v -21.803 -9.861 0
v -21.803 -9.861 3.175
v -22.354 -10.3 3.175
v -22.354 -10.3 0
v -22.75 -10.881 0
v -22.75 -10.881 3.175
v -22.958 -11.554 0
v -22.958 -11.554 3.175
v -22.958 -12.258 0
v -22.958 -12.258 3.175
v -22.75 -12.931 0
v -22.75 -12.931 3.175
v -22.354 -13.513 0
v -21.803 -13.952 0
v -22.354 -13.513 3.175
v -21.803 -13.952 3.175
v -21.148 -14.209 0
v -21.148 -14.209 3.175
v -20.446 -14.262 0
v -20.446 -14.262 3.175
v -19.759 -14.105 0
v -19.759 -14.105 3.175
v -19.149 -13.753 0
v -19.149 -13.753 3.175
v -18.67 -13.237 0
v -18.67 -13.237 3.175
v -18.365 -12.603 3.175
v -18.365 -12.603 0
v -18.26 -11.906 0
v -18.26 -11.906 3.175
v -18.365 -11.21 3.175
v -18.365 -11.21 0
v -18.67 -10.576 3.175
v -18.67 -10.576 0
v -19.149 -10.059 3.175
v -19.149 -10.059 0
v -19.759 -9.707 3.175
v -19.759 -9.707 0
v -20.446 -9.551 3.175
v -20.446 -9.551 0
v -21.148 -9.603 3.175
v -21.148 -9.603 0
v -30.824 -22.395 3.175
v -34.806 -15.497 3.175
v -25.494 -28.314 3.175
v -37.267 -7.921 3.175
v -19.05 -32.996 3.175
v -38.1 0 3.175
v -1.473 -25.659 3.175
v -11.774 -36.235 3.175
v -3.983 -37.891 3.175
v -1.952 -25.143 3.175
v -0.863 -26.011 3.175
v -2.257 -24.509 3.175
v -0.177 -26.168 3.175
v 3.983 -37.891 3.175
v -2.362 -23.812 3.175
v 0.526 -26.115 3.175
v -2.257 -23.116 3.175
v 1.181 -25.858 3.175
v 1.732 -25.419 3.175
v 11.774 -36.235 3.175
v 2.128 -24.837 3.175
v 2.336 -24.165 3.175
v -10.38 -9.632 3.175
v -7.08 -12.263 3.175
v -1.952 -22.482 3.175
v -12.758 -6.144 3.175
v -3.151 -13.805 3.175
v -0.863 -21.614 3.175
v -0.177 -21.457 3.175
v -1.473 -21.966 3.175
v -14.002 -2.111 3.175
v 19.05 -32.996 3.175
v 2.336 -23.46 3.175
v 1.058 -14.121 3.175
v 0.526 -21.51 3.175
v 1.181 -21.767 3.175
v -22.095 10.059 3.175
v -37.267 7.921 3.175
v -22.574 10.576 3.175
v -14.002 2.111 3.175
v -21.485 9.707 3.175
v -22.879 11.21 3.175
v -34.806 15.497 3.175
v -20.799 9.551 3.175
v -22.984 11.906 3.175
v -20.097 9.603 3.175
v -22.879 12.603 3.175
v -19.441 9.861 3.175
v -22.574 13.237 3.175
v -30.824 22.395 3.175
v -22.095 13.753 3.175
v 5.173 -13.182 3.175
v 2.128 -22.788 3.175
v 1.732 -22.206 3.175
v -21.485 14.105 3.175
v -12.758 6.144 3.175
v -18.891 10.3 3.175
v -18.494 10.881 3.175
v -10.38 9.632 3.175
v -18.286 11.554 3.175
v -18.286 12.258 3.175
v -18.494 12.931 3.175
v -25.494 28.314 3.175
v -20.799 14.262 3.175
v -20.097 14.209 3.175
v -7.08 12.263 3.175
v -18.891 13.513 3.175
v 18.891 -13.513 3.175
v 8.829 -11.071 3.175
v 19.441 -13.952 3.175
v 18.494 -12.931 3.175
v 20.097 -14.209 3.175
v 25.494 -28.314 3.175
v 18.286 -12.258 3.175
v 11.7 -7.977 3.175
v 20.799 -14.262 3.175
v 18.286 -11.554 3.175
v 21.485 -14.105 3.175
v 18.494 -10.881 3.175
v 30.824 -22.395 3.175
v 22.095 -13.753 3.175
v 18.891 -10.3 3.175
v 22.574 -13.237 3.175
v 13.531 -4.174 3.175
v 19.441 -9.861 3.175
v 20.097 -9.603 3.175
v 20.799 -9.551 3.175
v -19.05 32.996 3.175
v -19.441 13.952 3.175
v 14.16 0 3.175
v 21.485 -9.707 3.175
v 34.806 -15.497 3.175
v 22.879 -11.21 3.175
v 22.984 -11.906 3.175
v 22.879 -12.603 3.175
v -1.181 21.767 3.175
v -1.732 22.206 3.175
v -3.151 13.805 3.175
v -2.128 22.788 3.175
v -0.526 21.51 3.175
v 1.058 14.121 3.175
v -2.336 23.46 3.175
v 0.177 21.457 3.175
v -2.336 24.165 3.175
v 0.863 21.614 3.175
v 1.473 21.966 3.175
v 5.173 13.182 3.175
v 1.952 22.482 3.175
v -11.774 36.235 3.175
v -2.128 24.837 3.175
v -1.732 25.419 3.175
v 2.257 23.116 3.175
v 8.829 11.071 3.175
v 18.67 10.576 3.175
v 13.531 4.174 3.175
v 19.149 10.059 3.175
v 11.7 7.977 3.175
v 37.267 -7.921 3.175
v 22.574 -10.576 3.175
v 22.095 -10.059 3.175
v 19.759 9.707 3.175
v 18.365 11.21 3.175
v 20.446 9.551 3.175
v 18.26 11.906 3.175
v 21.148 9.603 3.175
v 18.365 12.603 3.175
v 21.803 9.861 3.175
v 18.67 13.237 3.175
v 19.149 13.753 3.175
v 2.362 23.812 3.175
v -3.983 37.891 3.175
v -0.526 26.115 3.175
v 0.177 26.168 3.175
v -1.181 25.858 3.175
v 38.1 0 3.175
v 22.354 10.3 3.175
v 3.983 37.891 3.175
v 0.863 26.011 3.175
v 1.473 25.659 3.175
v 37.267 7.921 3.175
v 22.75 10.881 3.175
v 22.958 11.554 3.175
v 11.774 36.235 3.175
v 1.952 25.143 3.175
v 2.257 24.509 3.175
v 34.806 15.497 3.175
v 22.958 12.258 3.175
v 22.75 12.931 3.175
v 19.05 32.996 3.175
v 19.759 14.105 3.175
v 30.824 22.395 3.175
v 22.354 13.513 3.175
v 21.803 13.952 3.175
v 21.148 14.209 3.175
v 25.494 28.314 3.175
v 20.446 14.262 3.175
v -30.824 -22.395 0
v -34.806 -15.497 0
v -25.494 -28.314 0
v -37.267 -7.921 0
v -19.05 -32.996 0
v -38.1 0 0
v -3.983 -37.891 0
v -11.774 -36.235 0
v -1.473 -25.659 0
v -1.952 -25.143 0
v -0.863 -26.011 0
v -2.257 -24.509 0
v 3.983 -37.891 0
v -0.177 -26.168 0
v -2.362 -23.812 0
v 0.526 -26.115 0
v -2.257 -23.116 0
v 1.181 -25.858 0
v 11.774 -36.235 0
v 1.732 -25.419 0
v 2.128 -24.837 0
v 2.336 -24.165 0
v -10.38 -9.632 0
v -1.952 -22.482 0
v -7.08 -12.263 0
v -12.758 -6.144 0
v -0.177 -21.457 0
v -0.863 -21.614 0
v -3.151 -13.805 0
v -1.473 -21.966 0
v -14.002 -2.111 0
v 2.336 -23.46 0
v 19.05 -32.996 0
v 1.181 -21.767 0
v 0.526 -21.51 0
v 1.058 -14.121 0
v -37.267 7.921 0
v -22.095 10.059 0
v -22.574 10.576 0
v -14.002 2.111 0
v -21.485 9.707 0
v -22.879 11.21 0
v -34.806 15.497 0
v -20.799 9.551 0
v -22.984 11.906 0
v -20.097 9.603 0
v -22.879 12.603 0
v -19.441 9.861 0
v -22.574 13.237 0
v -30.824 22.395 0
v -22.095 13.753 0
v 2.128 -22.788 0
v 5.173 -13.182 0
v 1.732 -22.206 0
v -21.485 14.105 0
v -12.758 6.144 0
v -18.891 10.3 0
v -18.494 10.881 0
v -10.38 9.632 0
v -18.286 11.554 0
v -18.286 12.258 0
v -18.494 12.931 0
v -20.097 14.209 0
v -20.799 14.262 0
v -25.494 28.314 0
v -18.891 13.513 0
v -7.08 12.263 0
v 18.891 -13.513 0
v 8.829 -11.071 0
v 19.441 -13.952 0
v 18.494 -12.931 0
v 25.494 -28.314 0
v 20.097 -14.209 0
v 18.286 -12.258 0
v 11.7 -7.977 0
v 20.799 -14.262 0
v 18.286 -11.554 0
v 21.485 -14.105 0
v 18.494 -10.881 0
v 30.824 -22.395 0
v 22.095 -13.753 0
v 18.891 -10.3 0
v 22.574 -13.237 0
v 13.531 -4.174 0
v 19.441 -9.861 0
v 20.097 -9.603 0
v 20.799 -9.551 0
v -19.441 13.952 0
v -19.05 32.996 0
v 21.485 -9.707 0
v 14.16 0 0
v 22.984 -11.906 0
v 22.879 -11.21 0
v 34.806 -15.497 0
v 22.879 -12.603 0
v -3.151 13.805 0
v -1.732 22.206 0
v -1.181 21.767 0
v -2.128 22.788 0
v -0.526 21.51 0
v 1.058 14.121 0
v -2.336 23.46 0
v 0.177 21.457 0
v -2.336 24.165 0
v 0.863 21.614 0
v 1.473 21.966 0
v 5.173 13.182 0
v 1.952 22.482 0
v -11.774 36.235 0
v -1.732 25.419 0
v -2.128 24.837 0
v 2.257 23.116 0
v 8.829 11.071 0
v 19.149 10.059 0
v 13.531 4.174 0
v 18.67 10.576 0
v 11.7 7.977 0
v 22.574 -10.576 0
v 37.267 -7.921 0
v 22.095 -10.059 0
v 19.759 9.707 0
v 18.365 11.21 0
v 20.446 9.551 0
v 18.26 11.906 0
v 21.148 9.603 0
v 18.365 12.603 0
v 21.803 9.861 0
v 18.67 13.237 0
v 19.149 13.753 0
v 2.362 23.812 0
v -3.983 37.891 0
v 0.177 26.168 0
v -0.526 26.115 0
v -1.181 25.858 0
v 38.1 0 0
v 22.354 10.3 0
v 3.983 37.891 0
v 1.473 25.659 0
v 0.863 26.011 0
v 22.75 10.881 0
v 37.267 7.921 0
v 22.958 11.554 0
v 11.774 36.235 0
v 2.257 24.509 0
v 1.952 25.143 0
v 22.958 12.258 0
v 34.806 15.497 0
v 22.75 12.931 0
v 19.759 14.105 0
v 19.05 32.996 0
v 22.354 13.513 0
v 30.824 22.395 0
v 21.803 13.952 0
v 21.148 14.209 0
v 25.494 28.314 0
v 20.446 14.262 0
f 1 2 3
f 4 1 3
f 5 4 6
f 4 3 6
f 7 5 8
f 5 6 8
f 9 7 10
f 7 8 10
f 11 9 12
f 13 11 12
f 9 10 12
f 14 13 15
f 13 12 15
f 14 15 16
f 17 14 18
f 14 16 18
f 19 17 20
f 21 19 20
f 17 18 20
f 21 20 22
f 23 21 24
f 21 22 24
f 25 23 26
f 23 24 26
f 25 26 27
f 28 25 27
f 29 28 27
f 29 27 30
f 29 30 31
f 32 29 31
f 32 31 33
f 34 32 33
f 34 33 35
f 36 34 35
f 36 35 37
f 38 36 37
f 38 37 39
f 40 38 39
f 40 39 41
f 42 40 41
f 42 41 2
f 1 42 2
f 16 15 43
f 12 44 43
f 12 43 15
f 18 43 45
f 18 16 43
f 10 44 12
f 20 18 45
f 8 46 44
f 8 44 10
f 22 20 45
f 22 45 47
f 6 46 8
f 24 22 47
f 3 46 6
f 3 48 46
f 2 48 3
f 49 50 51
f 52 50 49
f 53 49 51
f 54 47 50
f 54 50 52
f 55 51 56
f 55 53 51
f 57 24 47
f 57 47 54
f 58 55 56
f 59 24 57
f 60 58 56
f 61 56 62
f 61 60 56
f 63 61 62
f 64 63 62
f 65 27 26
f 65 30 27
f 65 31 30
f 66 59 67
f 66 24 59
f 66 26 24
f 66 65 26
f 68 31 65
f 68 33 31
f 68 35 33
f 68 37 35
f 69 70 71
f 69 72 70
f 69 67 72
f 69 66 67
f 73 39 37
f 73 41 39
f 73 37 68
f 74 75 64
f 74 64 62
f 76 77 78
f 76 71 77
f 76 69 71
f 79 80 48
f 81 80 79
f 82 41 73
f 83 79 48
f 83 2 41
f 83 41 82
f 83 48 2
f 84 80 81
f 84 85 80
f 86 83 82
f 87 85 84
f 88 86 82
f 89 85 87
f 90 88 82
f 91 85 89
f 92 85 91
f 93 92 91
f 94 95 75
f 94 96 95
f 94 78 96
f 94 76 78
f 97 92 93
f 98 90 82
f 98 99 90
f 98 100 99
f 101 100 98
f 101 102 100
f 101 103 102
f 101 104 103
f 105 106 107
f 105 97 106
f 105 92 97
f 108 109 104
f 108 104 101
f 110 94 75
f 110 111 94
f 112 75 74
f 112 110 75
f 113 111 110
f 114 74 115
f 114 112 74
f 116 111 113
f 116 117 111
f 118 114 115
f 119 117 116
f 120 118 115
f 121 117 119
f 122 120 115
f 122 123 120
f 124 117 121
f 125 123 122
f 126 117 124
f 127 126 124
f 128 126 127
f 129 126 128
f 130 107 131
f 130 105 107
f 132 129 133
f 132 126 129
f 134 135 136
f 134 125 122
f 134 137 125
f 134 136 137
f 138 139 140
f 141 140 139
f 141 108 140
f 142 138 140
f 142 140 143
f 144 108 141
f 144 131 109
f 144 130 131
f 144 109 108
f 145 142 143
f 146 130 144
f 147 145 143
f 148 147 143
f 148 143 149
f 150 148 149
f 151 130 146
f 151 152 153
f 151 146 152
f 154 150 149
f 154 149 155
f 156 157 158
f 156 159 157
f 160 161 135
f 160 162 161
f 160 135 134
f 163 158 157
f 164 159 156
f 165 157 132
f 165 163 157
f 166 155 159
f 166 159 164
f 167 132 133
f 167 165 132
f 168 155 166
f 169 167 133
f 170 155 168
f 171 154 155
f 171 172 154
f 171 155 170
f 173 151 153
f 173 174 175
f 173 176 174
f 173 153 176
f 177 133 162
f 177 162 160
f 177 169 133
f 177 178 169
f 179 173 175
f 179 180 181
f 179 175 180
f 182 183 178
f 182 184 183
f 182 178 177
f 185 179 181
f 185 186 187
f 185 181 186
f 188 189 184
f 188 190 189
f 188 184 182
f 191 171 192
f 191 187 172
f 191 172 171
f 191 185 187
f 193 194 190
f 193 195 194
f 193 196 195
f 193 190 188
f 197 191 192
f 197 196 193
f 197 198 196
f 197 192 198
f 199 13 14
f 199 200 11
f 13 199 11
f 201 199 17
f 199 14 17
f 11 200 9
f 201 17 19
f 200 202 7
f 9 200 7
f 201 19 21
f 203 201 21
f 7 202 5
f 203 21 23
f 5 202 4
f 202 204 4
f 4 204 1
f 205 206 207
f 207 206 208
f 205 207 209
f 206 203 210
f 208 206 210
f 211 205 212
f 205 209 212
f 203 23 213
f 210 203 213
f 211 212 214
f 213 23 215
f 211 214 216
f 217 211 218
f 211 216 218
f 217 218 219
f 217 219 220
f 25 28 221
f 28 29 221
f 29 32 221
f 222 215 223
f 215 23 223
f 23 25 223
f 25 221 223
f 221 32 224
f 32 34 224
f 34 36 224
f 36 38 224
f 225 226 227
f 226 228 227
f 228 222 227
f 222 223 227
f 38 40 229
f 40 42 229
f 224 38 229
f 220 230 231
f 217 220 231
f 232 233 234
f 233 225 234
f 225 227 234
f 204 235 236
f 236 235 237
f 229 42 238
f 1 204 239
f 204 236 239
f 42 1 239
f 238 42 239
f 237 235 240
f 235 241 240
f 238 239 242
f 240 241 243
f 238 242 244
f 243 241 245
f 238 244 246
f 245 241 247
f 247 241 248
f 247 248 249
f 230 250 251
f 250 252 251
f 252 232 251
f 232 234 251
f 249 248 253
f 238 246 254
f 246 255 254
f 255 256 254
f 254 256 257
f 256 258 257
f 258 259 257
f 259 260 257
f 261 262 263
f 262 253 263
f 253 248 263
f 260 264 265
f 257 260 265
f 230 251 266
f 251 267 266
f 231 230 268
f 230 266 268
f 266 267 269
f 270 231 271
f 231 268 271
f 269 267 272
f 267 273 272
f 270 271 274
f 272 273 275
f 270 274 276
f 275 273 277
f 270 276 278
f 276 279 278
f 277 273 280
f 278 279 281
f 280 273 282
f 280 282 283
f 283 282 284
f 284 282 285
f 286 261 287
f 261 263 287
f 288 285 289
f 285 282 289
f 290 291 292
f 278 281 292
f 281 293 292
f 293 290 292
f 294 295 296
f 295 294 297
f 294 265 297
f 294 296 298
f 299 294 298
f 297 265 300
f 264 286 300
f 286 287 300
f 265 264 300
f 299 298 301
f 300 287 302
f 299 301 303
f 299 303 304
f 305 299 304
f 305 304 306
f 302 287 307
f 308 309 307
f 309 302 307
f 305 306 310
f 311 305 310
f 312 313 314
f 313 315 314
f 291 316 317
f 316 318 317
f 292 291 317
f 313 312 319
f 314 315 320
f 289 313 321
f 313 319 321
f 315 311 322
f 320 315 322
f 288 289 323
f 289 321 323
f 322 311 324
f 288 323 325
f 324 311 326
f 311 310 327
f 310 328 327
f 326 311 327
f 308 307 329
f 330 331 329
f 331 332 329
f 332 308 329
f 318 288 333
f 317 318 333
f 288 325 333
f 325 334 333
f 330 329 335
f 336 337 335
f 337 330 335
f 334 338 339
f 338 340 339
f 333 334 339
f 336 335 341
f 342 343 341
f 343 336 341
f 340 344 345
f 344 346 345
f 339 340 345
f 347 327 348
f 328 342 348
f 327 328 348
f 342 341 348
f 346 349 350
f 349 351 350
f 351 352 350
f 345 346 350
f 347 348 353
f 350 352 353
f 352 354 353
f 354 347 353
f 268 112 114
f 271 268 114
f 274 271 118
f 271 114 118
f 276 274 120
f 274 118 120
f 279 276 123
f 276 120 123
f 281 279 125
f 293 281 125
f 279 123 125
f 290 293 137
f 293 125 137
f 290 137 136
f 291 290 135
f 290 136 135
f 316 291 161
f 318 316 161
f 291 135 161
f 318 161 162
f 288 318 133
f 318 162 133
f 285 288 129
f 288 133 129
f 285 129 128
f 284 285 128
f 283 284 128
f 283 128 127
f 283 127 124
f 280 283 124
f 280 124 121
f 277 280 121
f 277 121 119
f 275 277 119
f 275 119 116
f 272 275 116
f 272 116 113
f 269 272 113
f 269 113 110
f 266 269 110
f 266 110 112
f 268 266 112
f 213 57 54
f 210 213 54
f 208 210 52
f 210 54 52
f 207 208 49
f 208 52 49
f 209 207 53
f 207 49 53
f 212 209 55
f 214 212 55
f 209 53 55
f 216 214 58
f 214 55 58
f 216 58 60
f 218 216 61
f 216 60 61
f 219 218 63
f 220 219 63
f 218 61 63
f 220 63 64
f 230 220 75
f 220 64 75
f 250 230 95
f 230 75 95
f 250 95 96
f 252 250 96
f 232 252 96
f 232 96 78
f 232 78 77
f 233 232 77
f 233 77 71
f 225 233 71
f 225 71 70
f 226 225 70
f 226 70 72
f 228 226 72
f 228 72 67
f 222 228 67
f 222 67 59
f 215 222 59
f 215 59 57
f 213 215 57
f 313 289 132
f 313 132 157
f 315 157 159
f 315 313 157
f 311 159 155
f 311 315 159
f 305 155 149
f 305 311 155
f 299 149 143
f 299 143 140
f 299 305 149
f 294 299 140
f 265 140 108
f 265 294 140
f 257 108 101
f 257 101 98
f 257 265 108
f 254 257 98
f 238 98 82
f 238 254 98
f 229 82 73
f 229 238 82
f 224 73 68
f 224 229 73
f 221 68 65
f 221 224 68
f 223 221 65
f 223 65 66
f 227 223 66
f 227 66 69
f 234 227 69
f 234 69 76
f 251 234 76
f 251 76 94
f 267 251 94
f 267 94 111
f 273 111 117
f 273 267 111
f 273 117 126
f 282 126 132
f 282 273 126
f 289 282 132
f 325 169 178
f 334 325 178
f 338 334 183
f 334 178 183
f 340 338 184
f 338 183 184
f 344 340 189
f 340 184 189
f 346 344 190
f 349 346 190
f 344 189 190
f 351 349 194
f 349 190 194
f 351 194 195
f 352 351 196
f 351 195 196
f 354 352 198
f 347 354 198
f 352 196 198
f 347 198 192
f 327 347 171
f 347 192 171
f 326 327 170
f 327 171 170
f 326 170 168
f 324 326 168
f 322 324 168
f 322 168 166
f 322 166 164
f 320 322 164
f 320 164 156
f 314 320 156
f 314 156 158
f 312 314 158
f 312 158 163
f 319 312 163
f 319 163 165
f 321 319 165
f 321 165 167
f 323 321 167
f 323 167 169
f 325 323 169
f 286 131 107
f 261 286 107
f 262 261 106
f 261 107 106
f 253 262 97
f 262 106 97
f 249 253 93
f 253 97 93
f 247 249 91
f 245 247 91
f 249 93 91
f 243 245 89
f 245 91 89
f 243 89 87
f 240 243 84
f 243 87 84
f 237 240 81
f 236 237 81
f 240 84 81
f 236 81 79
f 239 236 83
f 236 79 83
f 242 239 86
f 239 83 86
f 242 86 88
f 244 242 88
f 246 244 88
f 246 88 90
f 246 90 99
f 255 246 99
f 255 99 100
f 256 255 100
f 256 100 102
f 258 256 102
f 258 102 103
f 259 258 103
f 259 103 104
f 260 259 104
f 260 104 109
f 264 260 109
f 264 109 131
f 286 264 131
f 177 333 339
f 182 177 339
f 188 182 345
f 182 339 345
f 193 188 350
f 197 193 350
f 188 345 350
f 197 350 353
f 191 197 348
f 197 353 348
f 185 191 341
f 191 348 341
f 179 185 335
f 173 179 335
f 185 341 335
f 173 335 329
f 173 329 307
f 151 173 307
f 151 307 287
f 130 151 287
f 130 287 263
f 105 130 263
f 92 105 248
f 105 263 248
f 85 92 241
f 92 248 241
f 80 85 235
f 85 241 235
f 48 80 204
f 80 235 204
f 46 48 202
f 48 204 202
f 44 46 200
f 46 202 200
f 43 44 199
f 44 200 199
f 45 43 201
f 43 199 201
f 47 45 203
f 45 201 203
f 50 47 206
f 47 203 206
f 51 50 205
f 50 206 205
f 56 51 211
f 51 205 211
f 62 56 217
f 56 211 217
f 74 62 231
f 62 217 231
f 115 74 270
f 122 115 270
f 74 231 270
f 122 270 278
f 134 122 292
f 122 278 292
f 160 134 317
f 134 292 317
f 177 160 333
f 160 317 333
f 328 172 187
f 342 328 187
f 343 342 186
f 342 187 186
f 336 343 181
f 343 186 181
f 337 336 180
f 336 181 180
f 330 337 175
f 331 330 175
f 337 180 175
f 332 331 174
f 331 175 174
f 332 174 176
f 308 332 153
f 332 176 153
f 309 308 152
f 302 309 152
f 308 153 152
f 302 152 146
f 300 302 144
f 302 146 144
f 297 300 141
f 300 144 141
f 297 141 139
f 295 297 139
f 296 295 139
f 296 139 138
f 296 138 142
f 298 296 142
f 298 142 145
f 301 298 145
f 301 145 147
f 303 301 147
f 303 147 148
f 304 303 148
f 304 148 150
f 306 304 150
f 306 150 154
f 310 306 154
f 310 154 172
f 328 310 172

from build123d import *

# Parameters (mm, degrees)
F0_R            = 38.1
F0_R_2          = 14.1605
F1_DEPTH        = 3.175
F2_R            = 2.3622
F3_DEPTH        = 3.176
F3_COPIES_COUNT = 6


# Not quite as in the source:
# - a pattern or mirror of a feature is missing from the dataset's text; its kind, count and spacing are read off the source's solid


with BuildPart() as f1:
    # F0 (on Top) → F1 (new body)
    with BuildSketch(Plane.XY):
        Circle(F0_R)
        Circle(F0_R_2, mode=Mode.SUBTRACT)
    extrude(amount=F1_DEPTH)

    # F2 (on face) → F3 (cut, through all)
    with BuildSketch(Plane.XY.offset(3.175)):
        with Locations((0, 23.8125)):
            Circle(F2_R)
    f3 = extrude(amount=-F3_DEPTH, mode=Mode.SUBTRACT)

    # F3_copies: F3 ×6 about axis
    f3_copies_axis = Axis((0, 0, 0), (0, 0, 1))
    for i in range(1, F3_COPIES_COUNT):
        add(f3.rotate(f3_copies_axis, i * 360 / F3_COPIES_COUNT), mode=Mode.SUBTRACT)


solid = f1.part
